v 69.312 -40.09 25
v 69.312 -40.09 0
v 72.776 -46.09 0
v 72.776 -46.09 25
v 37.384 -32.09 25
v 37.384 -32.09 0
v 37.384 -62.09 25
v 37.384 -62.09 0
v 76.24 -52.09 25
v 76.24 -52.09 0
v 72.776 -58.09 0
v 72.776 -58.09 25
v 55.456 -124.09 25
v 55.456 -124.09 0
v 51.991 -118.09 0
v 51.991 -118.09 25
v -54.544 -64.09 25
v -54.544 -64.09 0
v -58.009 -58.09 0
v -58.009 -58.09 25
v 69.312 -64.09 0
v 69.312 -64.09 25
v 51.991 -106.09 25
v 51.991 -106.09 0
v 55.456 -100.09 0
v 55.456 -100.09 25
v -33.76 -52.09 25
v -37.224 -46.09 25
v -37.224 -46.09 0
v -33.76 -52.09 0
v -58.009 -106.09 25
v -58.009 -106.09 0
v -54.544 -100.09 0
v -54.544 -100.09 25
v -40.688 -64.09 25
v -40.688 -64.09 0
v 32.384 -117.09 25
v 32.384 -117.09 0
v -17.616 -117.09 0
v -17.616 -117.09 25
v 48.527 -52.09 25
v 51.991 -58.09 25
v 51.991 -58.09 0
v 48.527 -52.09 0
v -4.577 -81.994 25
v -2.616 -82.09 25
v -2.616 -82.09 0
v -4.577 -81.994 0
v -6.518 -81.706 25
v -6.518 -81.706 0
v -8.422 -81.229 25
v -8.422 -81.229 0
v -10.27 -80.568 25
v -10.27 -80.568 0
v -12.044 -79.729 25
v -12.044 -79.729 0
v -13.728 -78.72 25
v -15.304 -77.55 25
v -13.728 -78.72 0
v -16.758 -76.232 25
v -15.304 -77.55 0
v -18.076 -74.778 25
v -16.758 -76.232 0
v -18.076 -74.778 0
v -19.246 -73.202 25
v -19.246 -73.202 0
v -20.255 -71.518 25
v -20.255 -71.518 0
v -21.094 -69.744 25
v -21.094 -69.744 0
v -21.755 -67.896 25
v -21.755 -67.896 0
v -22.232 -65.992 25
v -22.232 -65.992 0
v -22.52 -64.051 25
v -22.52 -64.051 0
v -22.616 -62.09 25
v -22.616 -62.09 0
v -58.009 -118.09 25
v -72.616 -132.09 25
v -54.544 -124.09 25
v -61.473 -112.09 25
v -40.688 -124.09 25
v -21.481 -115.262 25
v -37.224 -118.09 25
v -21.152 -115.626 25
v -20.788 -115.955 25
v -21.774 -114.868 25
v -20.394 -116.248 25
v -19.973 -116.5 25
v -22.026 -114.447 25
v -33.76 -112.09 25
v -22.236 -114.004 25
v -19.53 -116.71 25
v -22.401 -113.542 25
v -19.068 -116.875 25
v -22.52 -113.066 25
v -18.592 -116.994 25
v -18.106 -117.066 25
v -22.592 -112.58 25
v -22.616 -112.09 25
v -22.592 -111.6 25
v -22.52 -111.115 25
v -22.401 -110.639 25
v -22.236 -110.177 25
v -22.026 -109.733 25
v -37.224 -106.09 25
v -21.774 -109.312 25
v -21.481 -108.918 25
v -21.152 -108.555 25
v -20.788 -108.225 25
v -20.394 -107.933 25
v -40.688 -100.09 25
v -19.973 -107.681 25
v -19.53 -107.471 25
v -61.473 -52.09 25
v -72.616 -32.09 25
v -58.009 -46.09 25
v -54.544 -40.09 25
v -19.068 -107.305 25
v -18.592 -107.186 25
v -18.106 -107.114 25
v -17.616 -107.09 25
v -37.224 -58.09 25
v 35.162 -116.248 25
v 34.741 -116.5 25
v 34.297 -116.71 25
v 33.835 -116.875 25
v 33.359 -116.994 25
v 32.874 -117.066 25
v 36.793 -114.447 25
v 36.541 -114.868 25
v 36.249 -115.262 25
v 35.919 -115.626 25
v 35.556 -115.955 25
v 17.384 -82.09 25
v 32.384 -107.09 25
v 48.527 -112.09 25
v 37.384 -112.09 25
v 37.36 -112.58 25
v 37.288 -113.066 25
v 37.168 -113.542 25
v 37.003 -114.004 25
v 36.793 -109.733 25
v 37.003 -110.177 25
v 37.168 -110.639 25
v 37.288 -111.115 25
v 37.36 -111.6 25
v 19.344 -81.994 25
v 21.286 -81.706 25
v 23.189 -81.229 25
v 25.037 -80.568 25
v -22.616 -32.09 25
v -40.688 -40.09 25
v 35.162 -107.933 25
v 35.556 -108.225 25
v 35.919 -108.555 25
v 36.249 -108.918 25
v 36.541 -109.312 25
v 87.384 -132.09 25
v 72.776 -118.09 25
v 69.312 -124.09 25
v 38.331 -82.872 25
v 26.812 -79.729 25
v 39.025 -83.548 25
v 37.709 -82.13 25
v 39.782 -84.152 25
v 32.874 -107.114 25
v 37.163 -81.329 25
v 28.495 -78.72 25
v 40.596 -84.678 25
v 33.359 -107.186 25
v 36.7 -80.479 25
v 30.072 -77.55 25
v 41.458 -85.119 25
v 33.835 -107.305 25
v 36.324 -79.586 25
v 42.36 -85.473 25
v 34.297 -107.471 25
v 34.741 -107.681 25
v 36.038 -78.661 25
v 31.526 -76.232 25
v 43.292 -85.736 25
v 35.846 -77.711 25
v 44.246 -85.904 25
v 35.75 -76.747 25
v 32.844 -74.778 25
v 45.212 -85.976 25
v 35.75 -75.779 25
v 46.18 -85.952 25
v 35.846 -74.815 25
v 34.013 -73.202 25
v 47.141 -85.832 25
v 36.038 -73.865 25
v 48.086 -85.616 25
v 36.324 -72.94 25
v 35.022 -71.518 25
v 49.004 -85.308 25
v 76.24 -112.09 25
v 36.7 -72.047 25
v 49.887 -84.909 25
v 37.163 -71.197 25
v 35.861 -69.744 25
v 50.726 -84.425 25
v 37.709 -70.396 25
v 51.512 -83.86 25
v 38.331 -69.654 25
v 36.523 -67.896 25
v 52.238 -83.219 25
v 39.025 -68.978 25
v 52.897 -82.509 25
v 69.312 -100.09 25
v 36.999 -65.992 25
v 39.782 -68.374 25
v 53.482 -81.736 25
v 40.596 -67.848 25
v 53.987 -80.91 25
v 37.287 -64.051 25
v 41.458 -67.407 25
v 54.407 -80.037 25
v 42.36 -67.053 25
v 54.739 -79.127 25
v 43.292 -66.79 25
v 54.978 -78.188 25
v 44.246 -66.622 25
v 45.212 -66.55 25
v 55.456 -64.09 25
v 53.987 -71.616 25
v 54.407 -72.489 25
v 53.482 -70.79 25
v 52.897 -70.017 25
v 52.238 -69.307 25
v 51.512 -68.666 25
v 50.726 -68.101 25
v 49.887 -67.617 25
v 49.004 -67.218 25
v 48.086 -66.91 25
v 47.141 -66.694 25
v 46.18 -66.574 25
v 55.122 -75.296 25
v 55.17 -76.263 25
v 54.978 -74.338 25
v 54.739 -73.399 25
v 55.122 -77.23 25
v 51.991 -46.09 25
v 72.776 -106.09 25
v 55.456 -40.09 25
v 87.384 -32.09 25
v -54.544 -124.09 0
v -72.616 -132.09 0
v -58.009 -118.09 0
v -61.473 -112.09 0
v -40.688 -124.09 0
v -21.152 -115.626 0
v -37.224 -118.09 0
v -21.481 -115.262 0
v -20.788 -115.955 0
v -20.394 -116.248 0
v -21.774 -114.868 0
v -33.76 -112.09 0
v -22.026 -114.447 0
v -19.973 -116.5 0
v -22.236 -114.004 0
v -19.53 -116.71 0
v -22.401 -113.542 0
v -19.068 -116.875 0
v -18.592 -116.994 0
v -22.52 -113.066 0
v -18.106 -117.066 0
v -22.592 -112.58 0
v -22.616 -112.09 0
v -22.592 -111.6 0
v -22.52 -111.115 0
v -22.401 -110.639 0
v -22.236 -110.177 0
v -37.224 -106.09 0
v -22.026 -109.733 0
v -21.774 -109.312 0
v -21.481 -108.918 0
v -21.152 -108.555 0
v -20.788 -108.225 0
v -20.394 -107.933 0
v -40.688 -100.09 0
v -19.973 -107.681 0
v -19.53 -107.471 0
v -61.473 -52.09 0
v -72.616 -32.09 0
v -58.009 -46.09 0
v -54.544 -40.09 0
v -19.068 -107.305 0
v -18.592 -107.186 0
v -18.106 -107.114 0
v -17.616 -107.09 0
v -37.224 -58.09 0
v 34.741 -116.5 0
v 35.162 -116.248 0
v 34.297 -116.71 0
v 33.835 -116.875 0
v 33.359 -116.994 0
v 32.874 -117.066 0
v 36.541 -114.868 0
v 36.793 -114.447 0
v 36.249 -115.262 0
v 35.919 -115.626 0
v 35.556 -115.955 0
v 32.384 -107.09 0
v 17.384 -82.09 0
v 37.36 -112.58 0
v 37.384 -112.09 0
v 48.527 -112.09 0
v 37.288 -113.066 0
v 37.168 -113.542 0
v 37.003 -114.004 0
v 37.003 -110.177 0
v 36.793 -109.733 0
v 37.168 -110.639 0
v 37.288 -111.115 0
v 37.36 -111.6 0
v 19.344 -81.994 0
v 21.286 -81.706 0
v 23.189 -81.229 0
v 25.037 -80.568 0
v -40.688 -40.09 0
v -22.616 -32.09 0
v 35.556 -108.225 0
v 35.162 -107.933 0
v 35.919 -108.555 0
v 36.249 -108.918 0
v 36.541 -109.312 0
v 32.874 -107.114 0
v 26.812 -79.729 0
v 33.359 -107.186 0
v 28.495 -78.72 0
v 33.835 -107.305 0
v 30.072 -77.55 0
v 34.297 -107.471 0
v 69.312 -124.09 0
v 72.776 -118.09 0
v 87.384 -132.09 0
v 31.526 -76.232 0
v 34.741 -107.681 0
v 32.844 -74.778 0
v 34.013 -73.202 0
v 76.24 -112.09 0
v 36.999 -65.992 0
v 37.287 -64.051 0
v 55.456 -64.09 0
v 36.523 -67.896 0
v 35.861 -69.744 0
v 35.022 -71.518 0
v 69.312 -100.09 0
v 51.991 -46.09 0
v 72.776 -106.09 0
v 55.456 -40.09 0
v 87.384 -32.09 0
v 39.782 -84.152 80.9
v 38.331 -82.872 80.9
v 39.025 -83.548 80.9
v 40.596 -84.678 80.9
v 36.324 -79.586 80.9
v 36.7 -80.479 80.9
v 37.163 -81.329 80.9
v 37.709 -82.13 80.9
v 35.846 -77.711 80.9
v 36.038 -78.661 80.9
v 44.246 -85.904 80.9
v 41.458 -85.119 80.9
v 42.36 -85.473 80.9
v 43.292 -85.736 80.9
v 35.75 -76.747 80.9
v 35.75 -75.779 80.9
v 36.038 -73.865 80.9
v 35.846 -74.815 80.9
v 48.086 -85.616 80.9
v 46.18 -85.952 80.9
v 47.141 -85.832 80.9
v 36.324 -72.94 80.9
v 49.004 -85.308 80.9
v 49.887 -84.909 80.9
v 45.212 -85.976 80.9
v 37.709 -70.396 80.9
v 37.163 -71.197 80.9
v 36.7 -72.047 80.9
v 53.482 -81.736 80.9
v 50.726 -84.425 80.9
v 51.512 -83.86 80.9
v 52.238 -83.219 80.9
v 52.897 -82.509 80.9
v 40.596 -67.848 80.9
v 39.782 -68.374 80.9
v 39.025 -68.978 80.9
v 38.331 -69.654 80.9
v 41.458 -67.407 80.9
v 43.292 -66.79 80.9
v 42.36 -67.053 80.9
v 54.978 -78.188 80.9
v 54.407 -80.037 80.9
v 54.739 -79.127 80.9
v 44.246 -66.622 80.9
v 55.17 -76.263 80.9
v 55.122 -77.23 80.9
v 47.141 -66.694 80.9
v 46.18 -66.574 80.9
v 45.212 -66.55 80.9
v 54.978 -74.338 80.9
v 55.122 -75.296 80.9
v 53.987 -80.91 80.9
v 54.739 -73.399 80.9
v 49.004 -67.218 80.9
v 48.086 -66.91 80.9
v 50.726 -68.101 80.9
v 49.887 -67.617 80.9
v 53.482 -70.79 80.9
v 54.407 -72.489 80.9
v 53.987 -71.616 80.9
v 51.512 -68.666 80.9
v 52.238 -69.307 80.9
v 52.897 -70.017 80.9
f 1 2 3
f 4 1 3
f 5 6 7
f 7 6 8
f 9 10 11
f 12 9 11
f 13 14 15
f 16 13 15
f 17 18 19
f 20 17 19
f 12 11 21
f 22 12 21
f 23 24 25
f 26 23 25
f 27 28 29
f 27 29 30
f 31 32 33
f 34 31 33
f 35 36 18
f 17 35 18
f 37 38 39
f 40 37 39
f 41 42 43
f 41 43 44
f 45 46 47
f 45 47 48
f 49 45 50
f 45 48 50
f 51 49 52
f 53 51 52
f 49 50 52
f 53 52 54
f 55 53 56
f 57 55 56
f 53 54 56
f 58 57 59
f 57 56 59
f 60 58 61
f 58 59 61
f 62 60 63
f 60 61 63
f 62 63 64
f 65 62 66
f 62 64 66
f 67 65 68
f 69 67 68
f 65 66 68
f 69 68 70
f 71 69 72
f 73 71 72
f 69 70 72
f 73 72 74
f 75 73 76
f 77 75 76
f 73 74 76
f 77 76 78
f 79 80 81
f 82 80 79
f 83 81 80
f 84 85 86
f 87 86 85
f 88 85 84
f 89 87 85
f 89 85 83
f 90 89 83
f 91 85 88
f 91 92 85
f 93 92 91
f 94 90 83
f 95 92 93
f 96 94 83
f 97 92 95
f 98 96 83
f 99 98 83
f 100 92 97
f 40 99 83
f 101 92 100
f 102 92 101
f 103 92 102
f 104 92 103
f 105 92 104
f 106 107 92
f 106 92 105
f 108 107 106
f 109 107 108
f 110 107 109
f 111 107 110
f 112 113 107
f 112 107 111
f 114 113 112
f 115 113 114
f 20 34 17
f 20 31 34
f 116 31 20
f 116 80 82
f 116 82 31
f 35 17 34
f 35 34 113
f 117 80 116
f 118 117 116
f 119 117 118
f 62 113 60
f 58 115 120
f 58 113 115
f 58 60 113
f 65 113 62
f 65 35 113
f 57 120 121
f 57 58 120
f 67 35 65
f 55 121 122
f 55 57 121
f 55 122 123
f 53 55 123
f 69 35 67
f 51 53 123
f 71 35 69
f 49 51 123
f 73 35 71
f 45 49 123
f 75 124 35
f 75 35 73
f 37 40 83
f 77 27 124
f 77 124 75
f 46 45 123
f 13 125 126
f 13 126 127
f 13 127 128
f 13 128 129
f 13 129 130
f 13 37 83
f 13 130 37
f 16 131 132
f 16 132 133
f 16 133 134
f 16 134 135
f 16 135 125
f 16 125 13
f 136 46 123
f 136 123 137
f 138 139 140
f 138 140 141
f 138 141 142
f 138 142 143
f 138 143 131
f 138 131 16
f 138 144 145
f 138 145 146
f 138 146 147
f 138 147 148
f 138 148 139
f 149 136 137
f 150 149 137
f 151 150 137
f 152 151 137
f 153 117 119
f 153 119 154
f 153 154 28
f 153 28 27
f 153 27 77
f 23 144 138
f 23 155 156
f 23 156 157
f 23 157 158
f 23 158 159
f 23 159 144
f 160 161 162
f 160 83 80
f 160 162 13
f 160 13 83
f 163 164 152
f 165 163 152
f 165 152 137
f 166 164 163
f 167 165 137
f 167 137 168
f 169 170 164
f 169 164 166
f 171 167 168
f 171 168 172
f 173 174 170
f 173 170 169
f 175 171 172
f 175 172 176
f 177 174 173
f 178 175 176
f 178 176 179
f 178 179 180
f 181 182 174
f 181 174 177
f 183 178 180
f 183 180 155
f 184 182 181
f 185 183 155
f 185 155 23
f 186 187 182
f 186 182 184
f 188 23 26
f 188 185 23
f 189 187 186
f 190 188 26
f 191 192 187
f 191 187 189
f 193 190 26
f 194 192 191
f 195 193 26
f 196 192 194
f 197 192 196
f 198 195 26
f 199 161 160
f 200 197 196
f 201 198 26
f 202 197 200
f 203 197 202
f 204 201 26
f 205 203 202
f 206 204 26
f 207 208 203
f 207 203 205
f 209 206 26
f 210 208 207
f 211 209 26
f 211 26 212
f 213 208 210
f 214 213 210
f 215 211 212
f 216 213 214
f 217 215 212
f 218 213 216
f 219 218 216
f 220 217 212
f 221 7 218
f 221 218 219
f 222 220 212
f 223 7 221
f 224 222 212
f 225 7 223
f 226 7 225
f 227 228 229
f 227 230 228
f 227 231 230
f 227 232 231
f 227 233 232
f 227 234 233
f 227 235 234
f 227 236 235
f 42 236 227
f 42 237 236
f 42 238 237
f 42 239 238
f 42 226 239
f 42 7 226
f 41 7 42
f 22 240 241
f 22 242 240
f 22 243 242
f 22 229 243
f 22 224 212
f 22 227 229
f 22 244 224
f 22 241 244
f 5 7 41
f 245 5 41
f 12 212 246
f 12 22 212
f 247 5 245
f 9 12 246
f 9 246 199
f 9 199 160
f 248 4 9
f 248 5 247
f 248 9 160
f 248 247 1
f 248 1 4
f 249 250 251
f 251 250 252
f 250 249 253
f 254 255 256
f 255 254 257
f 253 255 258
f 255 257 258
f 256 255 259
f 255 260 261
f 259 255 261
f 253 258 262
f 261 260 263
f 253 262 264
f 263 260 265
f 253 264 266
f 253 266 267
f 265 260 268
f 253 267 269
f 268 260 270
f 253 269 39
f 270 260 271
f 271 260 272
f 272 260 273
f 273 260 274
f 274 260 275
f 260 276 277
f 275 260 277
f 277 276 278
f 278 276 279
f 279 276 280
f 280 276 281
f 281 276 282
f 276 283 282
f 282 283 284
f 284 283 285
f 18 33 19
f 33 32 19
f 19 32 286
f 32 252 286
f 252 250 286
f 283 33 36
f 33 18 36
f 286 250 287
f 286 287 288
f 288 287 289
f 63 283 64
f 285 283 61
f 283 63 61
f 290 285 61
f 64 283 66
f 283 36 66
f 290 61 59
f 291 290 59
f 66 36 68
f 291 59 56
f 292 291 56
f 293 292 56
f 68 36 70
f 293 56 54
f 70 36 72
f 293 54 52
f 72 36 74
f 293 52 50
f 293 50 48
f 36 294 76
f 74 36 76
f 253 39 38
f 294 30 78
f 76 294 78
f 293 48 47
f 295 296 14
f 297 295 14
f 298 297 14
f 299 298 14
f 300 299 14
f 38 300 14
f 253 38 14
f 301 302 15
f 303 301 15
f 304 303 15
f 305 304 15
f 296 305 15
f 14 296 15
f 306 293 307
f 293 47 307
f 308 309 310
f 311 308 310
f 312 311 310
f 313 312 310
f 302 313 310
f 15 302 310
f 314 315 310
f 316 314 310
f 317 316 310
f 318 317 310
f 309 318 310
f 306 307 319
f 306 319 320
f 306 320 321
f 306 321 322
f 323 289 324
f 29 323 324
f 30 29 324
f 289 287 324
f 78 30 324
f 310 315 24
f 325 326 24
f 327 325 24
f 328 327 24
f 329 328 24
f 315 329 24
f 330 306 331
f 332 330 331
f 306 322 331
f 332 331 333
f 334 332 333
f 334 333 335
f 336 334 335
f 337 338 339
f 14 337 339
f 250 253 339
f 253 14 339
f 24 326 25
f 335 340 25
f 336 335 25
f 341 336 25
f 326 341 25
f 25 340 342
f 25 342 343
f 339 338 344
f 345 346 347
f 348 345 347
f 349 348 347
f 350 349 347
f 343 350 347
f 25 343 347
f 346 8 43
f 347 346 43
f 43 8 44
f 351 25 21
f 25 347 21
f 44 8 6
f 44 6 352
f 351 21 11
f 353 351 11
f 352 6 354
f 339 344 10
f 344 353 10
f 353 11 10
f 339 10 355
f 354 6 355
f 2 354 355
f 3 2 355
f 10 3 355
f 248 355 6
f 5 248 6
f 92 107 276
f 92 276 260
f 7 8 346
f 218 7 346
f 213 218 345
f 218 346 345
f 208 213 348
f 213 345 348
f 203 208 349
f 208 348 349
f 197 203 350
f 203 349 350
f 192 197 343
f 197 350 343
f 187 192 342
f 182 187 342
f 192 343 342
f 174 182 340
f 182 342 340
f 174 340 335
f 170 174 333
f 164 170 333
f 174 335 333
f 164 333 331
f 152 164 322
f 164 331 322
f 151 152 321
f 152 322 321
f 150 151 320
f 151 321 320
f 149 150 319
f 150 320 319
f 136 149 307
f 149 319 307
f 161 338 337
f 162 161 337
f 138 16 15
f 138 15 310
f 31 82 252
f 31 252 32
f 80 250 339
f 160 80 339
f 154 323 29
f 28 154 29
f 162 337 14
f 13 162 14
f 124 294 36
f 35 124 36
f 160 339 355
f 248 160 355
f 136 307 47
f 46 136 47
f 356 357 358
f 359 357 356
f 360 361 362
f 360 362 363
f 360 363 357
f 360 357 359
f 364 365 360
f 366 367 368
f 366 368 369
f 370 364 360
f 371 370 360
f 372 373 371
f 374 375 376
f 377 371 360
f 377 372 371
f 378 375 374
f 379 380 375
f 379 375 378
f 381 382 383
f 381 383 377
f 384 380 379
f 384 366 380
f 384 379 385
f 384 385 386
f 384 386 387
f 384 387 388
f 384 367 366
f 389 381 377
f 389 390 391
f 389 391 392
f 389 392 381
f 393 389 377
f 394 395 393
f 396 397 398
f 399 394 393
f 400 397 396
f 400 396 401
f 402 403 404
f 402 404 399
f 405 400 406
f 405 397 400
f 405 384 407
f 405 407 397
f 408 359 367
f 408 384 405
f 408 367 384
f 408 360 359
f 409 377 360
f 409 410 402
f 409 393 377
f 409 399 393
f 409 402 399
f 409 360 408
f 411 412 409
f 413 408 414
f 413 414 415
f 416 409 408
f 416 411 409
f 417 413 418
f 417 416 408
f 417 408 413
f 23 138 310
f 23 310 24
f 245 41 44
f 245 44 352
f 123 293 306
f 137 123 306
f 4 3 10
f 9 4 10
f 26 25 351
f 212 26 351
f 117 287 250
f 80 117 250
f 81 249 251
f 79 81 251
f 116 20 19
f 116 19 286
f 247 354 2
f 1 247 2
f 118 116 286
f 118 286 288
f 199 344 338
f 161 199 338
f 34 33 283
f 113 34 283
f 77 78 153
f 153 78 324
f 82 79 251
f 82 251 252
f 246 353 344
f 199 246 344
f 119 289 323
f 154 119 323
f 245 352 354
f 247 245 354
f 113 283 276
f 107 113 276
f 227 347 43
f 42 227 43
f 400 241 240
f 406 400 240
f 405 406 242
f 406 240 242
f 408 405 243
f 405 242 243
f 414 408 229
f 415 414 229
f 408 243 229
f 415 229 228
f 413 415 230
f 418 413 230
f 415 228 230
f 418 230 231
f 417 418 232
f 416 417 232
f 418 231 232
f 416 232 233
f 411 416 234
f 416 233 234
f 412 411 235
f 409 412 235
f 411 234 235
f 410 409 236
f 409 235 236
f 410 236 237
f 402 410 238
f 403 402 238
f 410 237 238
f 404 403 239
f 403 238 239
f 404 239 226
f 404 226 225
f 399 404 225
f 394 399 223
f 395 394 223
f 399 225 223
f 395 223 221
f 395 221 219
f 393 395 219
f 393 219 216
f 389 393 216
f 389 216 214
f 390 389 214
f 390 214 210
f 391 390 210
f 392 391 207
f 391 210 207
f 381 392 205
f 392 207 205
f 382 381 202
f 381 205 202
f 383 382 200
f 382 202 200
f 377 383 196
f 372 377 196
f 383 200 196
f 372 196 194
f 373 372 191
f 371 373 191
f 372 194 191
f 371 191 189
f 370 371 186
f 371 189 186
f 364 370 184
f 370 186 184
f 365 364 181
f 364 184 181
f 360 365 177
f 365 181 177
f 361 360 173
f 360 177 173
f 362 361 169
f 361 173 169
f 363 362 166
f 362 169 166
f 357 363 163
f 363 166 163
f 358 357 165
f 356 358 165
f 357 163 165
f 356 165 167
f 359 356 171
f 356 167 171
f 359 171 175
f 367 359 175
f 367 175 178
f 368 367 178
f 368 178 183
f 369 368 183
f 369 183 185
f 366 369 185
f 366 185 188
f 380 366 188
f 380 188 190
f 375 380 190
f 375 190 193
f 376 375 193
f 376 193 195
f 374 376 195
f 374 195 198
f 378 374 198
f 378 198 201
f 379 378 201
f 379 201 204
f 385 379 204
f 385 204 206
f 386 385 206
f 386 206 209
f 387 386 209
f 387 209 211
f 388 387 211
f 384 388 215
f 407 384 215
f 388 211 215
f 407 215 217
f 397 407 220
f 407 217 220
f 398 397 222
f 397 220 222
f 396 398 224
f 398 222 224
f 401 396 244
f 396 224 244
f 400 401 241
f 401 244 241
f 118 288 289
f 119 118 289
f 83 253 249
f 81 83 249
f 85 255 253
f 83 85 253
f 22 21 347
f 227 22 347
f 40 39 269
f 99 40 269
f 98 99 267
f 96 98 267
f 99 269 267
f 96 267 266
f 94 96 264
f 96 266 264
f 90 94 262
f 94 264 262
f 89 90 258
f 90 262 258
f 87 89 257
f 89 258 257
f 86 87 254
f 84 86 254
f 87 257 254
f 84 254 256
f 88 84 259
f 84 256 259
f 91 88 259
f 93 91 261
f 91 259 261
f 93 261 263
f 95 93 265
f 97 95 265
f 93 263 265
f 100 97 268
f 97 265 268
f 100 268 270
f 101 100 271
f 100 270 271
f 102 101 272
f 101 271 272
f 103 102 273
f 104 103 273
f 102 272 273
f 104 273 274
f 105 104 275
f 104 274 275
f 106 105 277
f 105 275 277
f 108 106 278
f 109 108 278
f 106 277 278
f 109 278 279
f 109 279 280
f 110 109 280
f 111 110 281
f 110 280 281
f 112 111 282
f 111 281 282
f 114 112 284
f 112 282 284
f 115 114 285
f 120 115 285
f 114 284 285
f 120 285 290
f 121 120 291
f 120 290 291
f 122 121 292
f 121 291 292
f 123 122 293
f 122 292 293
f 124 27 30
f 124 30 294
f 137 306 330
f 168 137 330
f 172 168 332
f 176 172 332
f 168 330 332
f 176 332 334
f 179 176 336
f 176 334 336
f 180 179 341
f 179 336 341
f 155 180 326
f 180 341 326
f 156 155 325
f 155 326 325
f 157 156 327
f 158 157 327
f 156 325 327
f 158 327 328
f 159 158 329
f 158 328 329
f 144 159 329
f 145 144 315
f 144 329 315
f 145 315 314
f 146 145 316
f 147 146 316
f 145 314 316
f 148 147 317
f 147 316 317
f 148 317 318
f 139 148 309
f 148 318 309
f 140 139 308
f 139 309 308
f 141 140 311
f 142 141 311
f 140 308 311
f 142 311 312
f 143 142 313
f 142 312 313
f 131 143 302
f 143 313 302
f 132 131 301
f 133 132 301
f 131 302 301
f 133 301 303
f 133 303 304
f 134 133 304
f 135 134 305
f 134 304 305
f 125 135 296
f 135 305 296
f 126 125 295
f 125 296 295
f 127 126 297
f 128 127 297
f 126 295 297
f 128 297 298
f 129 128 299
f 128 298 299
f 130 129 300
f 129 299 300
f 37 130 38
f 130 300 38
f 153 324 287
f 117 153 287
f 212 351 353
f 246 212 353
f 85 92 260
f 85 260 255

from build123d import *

# Parameters (mm, degrees)
F1_DEPTH = 25
F3_R     = 9.716301
F4_DEPTH = 55.9


with BuildPart() as f1:
    # F0 (on Top) → F1 (new body)
    with BuildSketch(Plane.XY):
        with BuildLine():
            Line((-22.616219, -32.090175), (-72.616219, -32.090175))
            Line((-72.616219, -32.090175), (-72.616219, -112.090175))
            Line((-72.616219, -112.090175), (-72.616219, -132.090175))
            Line((-72.616219, -132.090175), (-17.616219, -132.090175))
            Line((-17.616219, -132.090175), (87.383781, -132.090175))
            Line((87.383781, -132.090175), (87.383781, -112.090175))
            Line((87.383781, -112.090175), (87.383781, -52.090175))
            Line((87.383781, -52.090175), (87.383781, -32.090175))
            Line((87.383781, -32.090175), (62.383781, -32.090175))
            Line((62.383781, -32.090175), (37.383781, -32.090175))
            Line((37.383781, -32.090175), (37.383781, -62.090175))
            ThreePointArc((37.383781, -62.090175), (31.525917, -76.23231), (17.383781, -82.090175))
            Line((17.383781, -82.090175), (-2.616219, -82.090175))
            ThreePointArc((-2.616219, -82.090175), (-16.758354, -76.23231), (-22.616219, -62.090175))
            Line((-22.616219, -62.090175), (-22.616219, -32.090175))
        make_face()
        Polygon((-40.688015, -100.090175), (-37.223914, -106.090175), (-33.759812, -112.090175), (-37.223914, -118.090175), (-40.688015, -124.090175), (-47.616219, -124.090175), (-54.544422, -124.090175), (-58.008523, -118.090175), (-61.472625, -112.090175), (-58.008523, -106.090175), (-54.544422, -100.090175), (-47.616219, -100.090175), align=None, mode=Mode.SUBTRACT)
        with BuildLine():
            ThreePointArc((-17.616219, -117.090175), (-22.616219, -112.090175), (-17.616219, -107.090175))
            Line((-17.616219, -107.090175), (32.383781, -107.090175))
            ThreePointArc((32.383781, -107.090175), (37.383781, -112.090175), (32.383781, -117.090175))
            Line((32.383781, -117.090175), (-17.616219, -117.090175))
        make_face(mode=Mode.SUBTRACT)
        Polygon((69.311985, -100.090175), (72.776086, -106.090175), (76.240188, -112.090175), (72.776086, -118.090175), (69.311985, -124.090175), (62.383781, -124.090175), (55.455578, -124.090175), (51.991477, -118.090175), (48.527375, -112.090175), (51.991477, -106.090175), (55.455578, -100.090175), (62.383781, -100.090175), align=None, mode=Mode.SUBTRACT)
        Polygon((-40.688015, -40.090175), (-37.223914, -46.090175), (-33.759812, -52.090175), (-37.223914, -58.090175), (-40.688015, -64.090175), (-47.616219, -64.090175), (-54.544422, -64.090175), (-58.008523, -58.090175), (-61.472625, -52.090175), (-58.008523, -46.090175), (-54.544422, -40.090175), (-47.616219, -40.090175), align=None, mode=Mode.SUBTRACT)
        Polygon((69.311985, -40.090175), (72.776087, -46.090175), (76.240188, -52.090175), (72.776086, -58.090175), (69.311985, -64.090175), (62.383781, -64.090175), (55.455578, -64.090175), (51.991477, -58.090175), (48.527375, -52.090175), (51.991477, -46.090175), (55.455578, -40.090175), (62.383781, -40.090175), align=None, mode=Mode.SUBTRACT)
    extrude(amount=F1_DEPTH)

    # F3 (on face) → F4 (join)
    with BuildSketch(Plane.XY.offset(25)):
        with Locations((45.454014, -76.263003)):
            Circle(F3_R)
    extrude(amount=F4_DEPTH)


solid = f1.part
